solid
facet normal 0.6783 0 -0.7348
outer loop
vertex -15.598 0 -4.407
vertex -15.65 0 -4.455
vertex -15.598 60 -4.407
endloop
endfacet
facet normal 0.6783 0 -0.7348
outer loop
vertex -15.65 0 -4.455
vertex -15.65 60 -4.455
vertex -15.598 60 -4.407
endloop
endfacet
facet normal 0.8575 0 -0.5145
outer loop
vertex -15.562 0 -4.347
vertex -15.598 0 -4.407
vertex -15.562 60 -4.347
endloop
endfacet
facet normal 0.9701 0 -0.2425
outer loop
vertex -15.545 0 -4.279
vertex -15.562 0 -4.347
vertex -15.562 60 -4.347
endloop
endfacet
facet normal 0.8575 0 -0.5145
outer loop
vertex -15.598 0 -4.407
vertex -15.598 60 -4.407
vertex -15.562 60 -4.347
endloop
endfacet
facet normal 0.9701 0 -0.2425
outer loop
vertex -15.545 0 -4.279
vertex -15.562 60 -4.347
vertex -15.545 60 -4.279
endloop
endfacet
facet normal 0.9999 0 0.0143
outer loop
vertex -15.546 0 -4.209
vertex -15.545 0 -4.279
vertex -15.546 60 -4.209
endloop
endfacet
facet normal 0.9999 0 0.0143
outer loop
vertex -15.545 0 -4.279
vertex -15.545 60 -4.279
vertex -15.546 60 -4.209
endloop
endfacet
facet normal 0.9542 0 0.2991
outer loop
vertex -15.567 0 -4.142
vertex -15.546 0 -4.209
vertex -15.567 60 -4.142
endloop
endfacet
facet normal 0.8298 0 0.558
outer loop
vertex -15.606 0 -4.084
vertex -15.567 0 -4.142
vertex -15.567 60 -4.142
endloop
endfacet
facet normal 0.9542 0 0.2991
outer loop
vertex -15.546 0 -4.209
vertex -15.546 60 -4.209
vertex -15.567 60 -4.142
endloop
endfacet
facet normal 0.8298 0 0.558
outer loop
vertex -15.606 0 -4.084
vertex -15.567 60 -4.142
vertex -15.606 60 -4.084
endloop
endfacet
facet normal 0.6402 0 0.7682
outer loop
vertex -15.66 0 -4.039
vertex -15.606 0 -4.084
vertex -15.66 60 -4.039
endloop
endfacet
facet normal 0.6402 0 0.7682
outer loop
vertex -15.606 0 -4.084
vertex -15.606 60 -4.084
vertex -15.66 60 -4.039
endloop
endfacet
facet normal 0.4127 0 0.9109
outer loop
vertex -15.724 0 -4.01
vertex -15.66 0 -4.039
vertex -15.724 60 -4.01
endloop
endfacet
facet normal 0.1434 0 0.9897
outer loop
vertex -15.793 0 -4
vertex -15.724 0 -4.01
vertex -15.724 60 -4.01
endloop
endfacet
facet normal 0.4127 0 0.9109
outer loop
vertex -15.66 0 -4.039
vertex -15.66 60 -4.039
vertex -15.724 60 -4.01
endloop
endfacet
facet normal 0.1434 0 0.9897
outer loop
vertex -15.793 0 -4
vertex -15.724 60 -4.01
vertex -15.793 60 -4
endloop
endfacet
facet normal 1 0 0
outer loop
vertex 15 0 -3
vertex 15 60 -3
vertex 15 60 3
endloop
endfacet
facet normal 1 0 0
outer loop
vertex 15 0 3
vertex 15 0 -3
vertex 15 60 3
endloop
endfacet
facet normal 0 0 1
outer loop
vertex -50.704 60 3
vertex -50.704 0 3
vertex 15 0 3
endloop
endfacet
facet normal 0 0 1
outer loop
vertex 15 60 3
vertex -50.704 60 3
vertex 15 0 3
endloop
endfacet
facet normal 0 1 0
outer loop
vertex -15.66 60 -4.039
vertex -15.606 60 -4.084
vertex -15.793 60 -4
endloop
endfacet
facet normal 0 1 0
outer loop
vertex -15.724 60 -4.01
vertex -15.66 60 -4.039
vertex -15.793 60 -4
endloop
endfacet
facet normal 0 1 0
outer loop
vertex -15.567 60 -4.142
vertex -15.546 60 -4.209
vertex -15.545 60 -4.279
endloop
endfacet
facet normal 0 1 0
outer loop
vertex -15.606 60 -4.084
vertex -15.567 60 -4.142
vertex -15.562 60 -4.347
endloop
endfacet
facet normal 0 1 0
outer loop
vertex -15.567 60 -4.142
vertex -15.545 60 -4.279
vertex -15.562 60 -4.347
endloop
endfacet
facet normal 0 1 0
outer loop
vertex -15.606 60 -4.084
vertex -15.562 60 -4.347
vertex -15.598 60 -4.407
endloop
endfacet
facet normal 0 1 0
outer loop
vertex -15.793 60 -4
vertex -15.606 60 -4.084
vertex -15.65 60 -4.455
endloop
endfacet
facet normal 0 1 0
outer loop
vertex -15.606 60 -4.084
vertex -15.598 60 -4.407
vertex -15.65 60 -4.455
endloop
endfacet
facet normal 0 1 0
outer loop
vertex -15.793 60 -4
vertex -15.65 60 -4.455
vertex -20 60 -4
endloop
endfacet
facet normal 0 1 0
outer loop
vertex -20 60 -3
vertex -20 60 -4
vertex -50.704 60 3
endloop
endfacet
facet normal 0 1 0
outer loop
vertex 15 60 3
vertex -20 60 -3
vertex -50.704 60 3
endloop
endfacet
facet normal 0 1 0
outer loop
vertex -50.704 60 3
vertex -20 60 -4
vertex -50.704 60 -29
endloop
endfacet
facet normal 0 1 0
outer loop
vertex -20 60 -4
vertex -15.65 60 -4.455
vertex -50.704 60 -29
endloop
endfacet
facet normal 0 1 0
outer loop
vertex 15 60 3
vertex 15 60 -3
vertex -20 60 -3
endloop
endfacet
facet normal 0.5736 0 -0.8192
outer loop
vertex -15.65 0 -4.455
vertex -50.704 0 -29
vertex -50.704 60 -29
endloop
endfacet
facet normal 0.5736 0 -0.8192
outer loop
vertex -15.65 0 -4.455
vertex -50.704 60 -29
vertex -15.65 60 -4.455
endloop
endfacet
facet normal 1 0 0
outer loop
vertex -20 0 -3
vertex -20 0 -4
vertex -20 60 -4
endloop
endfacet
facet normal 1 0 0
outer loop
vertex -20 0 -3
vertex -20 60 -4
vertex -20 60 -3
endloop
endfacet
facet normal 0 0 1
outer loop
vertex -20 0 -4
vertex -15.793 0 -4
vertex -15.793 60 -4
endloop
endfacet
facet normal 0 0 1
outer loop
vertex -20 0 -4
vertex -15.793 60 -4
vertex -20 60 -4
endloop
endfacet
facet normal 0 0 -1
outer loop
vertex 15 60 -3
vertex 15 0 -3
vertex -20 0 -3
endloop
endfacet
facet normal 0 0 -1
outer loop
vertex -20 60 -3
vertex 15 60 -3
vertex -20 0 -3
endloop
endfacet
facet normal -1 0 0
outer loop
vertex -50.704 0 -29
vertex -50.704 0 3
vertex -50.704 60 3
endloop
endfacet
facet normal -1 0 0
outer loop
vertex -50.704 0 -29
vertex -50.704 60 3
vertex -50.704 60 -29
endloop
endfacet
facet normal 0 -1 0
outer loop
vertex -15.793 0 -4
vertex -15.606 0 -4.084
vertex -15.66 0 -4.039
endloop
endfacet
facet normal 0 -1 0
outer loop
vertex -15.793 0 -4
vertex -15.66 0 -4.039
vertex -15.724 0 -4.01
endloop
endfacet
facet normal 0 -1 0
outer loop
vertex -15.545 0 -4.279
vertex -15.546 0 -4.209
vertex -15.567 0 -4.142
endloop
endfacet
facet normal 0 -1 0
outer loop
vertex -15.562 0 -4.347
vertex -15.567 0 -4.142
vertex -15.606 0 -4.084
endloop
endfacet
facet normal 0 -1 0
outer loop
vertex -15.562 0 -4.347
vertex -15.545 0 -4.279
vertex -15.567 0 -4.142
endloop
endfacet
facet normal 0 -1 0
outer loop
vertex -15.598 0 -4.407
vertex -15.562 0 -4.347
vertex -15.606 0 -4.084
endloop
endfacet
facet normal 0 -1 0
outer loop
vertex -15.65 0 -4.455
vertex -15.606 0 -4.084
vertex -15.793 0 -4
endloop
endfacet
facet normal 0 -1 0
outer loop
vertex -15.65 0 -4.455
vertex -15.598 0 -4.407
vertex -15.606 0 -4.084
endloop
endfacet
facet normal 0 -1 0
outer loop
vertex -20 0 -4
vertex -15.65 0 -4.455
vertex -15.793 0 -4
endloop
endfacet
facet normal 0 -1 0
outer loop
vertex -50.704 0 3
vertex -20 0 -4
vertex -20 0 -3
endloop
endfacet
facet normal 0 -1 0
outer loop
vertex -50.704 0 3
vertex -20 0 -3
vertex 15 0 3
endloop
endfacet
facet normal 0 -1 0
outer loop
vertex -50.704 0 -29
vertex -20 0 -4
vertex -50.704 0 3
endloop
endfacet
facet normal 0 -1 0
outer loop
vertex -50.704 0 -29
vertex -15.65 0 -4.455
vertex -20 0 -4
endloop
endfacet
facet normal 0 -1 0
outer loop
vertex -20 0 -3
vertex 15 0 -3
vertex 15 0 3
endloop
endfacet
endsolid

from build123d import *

# Parameters (mm, degrees)
BOSS_EXTRUDE1_DEPTH = 60
FILLET1_R           = 0.25


with BuildPart() as part:
    # Sketch1 → Boss-Extrude1 (new body)
    with BuildSketch(Plane(origin=(0, 0, 0), x_dir=(1, 0, 0), z_dir=(0, 1, 0))):
        Polygon((15, -3), (-15, -3), (-50.703700169, -3), (-50.703700169, 29), (-15, 4), (-20, 4), (-20, 3), (-15, 3), (15, 3), align=None)
    extrude(amount=BOSS_EXTRUDE1_DEPTH)

    # Fillet1
    fillet1_edges = [part.edges().sort_by_distance(p)[0] for p in [
        (-15, 30, -4),
    ]]
    fillet(fillet1_edges, radius=FILLET1_R)


solid = part.part
